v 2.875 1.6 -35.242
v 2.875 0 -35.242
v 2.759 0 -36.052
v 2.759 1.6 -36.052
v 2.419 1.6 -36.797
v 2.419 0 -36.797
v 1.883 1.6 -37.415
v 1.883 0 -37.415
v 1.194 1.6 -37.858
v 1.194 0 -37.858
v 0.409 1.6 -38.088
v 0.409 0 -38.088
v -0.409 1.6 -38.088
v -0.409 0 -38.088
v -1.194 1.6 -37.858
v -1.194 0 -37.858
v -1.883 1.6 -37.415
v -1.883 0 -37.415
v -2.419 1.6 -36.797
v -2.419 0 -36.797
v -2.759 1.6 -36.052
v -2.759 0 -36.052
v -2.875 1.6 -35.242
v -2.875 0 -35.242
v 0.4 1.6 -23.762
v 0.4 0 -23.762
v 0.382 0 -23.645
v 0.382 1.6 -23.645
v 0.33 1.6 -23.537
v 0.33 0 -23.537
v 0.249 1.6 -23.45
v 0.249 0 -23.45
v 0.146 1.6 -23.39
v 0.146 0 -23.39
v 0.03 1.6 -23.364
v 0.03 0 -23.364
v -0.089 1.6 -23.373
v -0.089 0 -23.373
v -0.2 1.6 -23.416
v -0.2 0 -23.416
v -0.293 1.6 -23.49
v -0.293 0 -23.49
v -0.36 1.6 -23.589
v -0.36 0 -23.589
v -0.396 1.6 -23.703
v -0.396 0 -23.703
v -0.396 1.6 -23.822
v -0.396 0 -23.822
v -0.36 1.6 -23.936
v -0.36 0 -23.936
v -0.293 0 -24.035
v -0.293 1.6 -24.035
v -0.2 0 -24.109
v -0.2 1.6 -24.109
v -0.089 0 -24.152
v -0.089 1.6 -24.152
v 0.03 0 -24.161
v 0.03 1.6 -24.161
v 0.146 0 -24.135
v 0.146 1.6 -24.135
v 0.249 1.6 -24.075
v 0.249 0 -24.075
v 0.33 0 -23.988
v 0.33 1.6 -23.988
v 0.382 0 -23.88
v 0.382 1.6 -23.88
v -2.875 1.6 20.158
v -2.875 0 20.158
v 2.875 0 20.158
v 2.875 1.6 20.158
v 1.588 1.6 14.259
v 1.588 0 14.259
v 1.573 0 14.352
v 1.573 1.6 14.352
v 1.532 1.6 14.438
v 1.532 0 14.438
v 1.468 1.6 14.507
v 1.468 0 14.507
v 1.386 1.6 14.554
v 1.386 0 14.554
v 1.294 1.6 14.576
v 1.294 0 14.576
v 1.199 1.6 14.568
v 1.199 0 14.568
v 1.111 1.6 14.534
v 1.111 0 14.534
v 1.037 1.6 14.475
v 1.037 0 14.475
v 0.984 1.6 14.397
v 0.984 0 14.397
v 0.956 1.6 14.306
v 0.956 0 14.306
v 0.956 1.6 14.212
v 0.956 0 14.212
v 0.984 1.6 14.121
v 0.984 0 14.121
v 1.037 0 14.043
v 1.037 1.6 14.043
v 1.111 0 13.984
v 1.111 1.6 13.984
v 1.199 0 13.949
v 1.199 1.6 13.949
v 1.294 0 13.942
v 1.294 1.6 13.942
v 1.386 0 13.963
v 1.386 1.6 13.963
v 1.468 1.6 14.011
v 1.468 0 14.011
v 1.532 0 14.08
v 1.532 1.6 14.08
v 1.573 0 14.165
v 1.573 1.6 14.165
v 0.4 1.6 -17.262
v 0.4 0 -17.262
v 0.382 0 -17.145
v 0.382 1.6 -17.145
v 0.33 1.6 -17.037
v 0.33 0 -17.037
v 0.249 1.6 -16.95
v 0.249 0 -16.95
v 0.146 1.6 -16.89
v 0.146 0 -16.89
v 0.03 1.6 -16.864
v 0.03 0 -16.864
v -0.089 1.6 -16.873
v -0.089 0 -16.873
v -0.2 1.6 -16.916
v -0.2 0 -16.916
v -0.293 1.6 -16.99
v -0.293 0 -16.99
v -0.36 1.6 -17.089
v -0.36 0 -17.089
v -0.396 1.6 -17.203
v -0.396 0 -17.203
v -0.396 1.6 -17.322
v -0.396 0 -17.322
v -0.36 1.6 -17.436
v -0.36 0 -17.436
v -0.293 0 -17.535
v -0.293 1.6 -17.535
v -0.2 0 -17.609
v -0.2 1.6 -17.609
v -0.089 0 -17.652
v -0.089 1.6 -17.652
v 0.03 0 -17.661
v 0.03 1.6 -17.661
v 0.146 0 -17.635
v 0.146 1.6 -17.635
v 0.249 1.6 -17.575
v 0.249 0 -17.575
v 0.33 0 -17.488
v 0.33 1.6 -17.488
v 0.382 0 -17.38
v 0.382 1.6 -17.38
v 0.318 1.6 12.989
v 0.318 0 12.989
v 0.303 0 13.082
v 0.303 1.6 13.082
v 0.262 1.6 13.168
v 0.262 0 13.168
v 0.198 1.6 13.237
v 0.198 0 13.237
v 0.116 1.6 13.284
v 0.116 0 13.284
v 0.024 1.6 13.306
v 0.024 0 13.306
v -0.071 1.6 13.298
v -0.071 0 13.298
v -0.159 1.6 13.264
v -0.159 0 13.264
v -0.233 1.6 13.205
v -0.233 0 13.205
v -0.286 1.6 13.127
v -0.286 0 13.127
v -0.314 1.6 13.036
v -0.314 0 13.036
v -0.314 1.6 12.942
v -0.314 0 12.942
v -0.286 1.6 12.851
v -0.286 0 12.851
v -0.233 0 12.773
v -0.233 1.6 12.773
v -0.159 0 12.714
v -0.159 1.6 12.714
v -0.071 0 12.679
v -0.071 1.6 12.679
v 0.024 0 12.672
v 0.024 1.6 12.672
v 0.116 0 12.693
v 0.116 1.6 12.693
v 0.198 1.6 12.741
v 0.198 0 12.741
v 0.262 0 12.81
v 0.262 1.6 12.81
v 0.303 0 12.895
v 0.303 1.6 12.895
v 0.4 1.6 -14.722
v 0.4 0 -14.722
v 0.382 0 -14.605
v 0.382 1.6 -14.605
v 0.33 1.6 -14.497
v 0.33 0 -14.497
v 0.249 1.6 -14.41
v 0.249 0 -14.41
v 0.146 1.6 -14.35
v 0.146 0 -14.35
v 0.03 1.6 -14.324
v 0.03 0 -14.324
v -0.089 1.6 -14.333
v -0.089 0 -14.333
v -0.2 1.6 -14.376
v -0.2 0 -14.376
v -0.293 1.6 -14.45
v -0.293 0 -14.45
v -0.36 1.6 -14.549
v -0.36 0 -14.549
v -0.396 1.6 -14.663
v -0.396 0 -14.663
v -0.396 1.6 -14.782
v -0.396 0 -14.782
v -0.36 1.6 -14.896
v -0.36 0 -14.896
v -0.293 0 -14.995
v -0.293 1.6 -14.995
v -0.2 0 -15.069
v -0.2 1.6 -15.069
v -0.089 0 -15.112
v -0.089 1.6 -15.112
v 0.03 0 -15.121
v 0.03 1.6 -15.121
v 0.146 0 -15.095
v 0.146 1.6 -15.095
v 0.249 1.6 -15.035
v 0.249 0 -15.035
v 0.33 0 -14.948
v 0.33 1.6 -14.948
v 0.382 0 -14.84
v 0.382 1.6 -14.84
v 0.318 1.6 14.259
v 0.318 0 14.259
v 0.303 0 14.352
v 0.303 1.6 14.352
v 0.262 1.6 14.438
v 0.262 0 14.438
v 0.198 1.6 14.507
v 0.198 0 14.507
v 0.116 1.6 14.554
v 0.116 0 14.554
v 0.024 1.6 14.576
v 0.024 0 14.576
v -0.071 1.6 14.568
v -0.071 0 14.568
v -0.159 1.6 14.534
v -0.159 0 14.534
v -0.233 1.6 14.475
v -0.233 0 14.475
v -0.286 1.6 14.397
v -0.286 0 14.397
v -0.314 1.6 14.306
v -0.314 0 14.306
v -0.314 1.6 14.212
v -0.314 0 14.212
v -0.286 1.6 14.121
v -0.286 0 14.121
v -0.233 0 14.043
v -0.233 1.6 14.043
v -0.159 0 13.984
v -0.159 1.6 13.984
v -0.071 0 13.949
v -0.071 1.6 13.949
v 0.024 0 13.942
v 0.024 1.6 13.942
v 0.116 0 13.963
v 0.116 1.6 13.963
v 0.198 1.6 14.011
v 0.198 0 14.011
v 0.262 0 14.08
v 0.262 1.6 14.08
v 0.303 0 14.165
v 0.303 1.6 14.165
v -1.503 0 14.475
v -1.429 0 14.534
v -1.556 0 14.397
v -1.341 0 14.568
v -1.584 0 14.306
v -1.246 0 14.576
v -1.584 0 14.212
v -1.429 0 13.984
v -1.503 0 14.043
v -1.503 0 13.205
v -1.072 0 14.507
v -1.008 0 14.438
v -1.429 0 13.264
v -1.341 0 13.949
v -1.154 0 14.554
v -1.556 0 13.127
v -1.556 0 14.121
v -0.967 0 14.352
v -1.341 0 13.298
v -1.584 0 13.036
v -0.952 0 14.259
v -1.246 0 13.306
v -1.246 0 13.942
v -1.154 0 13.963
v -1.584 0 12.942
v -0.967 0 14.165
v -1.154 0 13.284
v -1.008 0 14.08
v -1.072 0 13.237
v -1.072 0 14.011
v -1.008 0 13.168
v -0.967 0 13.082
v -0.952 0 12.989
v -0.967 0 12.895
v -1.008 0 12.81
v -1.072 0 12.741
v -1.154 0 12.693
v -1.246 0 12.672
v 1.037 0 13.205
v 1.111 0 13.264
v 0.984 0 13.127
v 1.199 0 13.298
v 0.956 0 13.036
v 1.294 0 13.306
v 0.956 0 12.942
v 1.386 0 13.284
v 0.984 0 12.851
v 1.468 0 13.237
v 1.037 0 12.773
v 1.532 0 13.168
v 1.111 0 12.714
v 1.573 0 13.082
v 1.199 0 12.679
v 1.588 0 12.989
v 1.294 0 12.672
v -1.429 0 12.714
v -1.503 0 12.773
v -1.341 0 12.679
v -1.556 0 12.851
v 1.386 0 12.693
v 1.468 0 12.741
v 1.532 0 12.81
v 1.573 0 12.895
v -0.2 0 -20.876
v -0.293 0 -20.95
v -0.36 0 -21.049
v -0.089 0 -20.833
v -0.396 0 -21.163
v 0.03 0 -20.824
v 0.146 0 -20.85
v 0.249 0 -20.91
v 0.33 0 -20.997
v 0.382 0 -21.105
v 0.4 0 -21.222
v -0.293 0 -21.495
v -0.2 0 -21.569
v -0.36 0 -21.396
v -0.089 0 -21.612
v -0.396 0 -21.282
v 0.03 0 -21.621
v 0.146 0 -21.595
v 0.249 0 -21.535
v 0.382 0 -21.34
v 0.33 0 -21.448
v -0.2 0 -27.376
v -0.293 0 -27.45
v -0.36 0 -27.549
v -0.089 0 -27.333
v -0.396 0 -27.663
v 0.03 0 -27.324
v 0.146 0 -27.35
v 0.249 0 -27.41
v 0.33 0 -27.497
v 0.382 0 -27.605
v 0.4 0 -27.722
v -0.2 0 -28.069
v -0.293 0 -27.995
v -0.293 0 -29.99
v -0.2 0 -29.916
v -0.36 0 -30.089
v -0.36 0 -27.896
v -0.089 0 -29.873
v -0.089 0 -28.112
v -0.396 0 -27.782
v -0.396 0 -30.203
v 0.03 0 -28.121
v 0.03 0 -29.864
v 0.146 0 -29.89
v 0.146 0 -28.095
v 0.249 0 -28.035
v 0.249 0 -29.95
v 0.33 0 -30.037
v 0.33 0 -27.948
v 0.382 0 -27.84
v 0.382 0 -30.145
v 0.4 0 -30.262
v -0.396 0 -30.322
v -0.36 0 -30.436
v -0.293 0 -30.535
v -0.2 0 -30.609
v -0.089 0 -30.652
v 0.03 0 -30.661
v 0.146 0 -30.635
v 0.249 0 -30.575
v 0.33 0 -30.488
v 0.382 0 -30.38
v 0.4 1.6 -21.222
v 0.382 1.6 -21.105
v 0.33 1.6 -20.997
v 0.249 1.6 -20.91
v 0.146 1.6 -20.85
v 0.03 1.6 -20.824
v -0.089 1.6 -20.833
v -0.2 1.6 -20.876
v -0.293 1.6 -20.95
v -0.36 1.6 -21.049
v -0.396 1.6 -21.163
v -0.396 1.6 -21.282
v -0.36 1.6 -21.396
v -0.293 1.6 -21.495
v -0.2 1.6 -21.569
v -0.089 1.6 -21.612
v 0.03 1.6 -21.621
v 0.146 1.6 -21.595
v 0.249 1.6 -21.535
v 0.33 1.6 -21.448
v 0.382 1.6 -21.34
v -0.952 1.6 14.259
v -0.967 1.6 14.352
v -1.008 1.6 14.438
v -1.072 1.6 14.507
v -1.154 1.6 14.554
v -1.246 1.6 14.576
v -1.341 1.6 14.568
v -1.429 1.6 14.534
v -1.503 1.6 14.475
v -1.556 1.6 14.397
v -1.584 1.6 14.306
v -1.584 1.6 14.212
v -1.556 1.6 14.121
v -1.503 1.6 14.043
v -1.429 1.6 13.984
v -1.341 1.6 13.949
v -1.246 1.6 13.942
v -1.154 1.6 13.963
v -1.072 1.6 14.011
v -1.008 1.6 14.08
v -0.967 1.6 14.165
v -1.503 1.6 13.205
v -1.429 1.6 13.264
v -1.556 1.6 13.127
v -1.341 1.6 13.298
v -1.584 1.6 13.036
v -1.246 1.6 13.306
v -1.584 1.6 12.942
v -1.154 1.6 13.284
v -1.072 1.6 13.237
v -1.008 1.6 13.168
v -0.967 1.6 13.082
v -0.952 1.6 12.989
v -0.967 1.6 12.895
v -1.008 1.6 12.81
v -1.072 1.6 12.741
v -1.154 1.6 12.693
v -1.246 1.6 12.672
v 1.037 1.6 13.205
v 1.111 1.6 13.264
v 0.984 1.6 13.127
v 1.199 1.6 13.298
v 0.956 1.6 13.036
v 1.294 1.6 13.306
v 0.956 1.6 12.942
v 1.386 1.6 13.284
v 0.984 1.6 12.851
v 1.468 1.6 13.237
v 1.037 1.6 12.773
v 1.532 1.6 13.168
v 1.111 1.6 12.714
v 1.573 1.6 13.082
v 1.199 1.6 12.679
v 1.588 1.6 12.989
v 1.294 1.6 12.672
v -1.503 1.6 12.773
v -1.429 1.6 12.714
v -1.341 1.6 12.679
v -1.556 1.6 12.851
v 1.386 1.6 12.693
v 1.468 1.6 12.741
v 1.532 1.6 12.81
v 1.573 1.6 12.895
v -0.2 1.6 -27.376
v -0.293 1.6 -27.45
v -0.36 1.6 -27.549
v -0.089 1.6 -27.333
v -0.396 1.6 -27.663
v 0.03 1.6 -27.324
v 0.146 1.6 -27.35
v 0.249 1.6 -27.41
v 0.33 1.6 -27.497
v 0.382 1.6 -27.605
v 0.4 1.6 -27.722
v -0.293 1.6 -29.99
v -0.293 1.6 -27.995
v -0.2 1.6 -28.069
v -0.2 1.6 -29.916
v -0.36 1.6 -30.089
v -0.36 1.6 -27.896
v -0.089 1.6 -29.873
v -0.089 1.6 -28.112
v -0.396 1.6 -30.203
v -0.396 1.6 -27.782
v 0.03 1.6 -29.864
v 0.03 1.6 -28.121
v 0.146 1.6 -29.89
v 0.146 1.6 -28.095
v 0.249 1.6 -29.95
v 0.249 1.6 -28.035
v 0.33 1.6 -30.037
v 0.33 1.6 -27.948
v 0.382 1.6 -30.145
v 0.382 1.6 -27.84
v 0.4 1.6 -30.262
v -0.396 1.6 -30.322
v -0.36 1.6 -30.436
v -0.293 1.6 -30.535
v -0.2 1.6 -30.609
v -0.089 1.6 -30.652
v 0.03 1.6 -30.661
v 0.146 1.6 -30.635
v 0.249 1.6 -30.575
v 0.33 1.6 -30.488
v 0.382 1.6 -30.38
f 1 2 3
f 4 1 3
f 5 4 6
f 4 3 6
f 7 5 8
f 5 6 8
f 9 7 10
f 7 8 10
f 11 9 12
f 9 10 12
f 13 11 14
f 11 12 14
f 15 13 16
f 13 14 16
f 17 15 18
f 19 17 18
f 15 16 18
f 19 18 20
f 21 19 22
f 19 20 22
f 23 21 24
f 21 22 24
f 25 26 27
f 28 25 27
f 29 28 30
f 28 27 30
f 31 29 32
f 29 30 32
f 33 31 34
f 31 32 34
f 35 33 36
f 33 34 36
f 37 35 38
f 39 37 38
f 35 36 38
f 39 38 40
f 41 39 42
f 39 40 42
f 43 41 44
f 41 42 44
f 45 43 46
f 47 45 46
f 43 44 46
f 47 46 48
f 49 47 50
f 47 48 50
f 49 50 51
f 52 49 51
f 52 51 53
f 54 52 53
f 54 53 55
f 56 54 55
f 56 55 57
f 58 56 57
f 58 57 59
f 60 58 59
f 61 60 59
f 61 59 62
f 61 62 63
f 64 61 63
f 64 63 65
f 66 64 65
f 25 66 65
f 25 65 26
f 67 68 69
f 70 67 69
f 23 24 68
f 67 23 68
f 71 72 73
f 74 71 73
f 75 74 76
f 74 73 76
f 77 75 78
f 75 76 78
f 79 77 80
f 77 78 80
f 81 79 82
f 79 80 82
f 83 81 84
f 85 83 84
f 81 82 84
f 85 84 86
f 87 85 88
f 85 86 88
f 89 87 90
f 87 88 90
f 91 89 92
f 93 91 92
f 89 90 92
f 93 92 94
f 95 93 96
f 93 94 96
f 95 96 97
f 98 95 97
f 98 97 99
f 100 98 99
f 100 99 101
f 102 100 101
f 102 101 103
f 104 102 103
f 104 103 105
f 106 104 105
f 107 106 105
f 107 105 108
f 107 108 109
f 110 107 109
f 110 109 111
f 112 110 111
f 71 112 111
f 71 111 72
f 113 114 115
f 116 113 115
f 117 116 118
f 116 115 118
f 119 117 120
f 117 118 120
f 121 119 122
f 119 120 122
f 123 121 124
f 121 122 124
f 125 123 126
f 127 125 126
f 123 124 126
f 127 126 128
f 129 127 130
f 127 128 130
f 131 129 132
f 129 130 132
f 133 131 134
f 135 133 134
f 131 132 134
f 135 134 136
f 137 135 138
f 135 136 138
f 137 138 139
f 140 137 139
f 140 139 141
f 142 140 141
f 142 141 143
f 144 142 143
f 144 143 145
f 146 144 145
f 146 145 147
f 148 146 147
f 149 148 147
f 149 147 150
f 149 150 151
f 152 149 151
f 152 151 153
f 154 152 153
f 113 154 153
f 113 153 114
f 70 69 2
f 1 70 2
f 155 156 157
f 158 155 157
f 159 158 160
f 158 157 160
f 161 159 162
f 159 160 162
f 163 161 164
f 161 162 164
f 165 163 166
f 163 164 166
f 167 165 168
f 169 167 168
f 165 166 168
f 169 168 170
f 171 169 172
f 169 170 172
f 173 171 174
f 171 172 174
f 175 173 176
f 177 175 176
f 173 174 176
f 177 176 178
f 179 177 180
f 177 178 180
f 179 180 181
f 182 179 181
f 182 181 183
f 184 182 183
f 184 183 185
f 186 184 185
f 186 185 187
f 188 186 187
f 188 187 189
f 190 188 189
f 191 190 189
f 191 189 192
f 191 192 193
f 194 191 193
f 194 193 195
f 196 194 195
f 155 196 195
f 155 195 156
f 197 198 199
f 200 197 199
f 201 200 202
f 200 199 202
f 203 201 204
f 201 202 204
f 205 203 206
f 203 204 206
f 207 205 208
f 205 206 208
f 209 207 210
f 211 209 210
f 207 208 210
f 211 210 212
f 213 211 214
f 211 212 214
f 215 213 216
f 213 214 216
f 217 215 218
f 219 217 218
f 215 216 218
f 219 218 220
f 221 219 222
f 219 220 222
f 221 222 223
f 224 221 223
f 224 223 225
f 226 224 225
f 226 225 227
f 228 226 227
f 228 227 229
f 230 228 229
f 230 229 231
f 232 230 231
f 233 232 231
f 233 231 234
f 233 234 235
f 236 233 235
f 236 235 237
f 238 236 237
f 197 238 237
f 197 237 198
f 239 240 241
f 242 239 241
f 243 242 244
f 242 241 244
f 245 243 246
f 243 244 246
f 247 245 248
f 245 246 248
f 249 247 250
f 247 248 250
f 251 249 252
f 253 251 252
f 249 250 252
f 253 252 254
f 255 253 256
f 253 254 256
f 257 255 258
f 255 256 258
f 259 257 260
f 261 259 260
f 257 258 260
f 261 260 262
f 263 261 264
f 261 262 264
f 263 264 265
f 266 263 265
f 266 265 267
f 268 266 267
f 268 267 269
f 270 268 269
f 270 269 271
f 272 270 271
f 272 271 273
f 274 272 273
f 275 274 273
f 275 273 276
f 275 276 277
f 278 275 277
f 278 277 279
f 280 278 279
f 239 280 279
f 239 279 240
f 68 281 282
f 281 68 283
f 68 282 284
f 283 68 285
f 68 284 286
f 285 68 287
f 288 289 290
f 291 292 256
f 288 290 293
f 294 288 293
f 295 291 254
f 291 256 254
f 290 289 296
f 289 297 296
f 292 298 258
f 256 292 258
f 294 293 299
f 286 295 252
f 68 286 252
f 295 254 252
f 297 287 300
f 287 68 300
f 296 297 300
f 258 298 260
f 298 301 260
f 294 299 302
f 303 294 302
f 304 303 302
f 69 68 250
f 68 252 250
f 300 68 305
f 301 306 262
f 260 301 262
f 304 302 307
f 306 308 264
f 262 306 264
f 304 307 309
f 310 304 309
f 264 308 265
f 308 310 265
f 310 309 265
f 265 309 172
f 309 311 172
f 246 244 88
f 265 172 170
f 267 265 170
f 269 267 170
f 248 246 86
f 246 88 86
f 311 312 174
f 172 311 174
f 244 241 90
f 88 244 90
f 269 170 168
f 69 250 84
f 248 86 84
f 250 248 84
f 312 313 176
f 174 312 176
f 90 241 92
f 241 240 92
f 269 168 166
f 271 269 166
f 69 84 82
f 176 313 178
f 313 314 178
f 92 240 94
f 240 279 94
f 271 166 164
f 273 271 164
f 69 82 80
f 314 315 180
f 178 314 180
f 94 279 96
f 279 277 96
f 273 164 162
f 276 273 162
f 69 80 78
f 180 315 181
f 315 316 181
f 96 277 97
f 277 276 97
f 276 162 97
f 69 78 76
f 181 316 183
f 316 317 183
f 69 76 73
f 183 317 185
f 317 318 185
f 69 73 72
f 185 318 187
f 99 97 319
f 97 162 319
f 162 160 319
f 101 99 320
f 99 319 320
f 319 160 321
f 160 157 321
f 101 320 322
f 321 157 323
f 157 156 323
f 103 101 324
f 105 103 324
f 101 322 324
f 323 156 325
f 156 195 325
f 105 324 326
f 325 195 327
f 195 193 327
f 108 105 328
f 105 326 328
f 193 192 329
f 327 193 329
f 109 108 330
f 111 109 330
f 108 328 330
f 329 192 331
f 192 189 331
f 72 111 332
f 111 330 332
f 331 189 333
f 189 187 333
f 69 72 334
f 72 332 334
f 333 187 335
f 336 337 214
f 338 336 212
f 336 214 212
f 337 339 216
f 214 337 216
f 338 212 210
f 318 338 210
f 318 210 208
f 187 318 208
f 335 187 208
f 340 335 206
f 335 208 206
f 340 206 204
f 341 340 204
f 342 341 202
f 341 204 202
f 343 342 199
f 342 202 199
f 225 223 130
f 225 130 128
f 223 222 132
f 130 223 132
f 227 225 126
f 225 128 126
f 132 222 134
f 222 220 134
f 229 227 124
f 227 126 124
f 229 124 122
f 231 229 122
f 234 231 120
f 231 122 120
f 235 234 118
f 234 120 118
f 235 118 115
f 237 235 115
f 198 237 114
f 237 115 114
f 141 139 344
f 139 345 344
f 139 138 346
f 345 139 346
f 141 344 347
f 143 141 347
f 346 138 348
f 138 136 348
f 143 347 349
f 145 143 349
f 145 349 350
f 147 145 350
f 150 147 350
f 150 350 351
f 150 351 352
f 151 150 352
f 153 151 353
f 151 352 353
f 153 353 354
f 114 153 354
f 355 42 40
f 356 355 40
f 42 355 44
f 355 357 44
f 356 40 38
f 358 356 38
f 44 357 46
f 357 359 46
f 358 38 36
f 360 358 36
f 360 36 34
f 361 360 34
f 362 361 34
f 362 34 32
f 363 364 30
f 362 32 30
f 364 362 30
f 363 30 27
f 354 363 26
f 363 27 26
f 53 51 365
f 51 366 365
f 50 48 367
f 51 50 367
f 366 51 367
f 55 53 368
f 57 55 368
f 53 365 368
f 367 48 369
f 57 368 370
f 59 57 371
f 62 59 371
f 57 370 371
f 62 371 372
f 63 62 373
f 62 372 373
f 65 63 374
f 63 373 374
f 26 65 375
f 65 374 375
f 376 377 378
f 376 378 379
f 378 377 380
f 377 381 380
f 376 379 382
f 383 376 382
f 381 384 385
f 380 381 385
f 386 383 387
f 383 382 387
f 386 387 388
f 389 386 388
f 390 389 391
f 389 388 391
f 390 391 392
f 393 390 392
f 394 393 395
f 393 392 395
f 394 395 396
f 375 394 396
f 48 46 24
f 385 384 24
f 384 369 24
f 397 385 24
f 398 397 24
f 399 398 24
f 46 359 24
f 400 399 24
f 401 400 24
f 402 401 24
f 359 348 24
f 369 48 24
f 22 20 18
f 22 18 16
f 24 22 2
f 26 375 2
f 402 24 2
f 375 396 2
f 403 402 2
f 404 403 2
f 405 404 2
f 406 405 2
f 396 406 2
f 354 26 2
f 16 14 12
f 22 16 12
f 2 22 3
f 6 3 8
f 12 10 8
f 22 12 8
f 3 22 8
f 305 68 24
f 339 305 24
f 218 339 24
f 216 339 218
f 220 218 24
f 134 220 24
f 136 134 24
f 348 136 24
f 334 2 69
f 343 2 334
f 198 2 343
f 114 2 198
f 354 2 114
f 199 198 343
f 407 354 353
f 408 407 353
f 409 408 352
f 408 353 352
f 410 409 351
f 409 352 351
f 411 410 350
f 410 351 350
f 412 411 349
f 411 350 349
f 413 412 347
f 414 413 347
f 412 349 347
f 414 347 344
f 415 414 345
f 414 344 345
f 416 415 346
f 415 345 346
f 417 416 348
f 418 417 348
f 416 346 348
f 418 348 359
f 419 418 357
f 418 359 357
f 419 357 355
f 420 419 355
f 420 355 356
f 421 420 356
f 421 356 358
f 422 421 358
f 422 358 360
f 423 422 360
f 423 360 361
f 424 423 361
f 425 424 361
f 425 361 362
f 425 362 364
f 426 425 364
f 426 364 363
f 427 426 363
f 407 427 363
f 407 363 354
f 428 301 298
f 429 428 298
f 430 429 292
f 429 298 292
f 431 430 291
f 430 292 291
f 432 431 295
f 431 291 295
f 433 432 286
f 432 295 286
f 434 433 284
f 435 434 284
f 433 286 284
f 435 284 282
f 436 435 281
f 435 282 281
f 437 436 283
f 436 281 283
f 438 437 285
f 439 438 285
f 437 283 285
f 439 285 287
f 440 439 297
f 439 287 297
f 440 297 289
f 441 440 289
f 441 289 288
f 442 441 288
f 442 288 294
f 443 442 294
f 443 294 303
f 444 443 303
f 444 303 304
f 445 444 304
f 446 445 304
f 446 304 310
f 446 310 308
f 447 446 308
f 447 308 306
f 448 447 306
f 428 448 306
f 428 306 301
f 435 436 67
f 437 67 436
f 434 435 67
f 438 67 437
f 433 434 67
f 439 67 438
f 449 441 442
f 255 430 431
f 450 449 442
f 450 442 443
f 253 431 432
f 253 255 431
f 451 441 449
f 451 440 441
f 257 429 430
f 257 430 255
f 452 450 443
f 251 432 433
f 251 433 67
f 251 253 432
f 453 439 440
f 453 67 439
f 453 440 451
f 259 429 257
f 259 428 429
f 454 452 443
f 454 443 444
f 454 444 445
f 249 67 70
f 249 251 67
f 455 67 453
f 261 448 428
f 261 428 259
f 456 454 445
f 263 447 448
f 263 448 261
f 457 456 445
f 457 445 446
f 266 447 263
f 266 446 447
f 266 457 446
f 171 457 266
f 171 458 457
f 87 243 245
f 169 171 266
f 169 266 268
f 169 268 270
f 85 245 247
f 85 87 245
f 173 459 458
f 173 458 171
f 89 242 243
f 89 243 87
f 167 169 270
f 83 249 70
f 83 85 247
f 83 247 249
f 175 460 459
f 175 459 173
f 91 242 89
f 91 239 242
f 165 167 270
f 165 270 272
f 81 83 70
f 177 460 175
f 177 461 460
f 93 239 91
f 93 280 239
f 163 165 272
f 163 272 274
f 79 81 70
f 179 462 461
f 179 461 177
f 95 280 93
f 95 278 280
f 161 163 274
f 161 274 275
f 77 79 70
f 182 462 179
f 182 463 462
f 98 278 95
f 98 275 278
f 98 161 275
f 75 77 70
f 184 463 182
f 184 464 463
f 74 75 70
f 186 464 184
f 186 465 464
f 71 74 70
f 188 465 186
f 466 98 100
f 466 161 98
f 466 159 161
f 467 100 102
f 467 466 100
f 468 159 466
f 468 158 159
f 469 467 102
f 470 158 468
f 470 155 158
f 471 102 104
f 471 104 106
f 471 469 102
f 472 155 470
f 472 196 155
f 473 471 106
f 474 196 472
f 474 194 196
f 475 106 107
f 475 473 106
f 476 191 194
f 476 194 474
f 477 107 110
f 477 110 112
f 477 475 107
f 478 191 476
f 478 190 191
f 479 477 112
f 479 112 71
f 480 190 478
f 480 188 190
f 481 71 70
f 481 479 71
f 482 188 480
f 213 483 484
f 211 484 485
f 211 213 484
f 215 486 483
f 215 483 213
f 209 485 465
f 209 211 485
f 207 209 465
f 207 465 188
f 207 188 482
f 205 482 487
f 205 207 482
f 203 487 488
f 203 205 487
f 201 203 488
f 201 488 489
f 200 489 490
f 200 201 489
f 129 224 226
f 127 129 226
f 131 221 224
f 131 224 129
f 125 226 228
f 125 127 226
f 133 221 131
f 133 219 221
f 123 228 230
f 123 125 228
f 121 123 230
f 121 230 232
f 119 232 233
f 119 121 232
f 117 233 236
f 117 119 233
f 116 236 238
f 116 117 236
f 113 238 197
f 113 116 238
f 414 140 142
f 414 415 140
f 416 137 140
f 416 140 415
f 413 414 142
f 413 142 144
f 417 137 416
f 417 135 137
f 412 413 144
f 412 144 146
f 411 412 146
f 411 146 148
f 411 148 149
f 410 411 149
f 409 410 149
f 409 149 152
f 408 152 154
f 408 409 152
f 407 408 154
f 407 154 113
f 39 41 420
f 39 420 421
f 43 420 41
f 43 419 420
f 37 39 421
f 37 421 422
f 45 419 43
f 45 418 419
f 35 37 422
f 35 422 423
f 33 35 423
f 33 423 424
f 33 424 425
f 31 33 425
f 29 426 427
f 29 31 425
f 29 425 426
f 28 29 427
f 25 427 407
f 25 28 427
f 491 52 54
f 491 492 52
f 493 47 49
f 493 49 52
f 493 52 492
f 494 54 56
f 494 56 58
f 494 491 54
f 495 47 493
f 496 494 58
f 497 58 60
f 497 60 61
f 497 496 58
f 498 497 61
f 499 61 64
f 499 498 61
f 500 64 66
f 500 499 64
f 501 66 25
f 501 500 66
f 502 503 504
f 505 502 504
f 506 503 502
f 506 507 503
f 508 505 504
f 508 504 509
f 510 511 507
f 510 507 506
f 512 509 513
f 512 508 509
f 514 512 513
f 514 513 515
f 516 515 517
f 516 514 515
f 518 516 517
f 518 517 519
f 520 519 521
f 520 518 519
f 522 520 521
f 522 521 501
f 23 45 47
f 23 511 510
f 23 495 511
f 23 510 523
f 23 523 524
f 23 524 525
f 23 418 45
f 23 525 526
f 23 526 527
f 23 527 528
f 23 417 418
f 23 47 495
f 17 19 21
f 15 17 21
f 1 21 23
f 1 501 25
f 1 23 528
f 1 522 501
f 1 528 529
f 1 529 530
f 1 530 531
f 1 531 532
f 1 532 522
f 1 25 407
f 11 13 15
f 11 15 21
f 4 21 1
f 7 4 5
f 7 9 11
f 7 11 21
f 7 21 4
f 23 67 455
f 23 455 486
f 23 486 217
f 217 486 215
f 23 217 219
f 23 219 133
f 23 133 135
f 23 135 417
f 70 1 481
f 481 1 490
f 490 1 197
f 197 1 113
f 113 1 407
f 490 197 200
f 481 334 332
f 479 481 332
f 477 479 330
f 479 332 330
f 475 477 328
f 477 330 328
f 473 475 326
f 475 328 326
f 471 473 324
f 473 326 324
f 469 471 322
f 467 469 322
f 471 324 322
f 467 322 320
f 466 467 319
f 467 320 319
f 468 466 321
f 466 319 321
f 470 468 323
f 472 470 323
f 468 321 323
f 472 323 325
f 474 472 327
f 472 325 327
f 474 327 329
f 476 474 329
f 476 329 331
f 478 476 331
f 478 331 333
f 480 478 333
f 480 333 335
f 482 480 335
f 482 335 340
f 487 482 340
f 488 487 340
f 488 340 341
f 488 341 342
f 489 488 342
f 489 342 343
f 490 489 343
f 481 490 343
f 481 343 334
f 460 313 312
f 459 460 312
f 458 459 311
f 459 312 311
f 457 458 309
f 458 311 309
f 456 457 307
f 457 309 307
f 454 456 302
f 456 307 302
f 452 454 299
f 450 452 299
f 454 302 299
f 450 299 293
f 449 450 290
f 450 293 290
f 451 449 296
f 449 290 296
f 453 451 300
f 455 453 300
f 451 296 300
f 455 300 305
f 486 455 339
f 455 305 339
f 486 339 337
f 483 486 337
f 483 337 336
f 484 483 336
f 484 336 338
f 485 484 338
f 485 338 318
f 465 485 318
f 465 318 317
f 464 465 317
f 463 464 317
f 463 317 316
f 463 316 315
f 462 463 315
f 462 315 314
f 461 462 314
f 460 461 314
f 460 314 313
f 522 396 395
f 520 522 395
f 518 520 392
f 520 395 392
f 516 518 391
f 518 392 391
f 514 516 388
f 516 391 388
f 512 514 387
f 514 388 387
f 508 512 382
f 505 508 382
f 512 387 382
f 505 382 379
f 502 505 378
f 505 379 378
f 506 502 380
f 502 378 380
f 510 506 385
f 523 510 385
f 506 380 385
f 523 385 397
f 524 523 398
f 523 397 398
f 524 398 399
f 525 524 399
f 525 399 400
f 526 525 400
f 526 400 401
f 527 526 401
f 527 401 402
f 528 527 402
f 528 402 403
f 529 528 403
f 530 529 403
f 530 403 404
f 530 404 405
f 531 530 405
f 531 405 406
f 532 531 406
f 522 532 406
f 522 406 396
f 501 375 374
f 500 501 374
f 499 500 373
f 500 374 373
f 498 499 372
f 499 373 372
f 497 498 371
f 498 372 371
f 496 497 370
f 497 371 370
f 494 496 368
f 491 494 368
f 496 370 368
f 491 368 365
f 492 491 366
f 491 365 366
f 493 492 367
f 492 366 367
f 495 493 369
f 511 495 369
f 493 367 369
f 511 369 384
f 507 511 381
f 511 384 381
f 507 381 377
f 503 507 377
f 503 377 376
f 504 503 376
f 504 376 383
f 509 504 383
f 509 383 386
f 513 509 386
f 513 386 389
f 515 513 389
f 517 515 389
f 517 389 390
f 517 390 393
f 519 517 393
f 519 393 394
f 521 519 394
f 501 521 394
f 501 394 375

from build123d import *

# Parameters (mm, degrees)
BOSS_EXTRUDE1_DEPTH = 1.6
SKETCH2_R           = 0.3175
SKETCH2_R_2         = 0.4
CUT_EXTRUDE1_DEPTH  = 2.6


with BuildPart() as part:
    # Sketch1 → Boss-Extrude1 (new body)
    with BuildSketch(Plane(origin=(0, 0, 0), x_dir=(1, 0, 0), z_dir=(0, 1, 0))):
        with BuildLine():
            Line((-2.875, 35.2425), (-2.875, -20.1575))
            Line((-2.875, -20.1575), (2.875, -20.1575))
            Line((2.875, -20.1575), (2.875, 35.2425))
            ThreePointArc((2.875, 35.2425), (0, 38.1175), (-2.875, 35.2425))
        make_face()
    extrude(amount=BOSS_EXTRUDE1_DEPTH)

    # Sketch2 → Cut-Extrude1 (cut, through all)
    with BuildSketch(Plane.XZ):
        with Locations((1.27, 12.9889)):
            Circle(SKETCH2_R)
        with Locations((0, 12.9889)):
            Circle(SKETCH2_R)
        with Locations((-1.27, 12.9889)):
            Circle(SKETCH2_R)
        with Locations((0, 14.2589)):
            Circle(SKETCH2_R)
        with Locations((-1.27, 14.2589)):
            Circle(SKETCH2_R)
        with Locations((1.27, 14.2589)):
            Circle(SKETCH2_R)
        with Locations((0, -30.2625)):
            Circle(SKETCH2_R_2)
        with Locations((0, -23.7625)):
            Circle(SKETCH2_R_2)
        with Locations((0, -17.2625)):
            Circle(SKETCH2_R_2)
        with Locations((0, -27.7225)):
            Circle(SKETCH2_R_2)
        with Locations((0, -21.2225)):
            Circle(SKETCH2_R_2)
        with Locations((0, -14.7225)):
            Circle(SKETCH2_R_2)
    extrude(amount=-CUT_EXTRUDE1_DEPTH, mode=Mode.SUBTRACT)


solid = part.part
